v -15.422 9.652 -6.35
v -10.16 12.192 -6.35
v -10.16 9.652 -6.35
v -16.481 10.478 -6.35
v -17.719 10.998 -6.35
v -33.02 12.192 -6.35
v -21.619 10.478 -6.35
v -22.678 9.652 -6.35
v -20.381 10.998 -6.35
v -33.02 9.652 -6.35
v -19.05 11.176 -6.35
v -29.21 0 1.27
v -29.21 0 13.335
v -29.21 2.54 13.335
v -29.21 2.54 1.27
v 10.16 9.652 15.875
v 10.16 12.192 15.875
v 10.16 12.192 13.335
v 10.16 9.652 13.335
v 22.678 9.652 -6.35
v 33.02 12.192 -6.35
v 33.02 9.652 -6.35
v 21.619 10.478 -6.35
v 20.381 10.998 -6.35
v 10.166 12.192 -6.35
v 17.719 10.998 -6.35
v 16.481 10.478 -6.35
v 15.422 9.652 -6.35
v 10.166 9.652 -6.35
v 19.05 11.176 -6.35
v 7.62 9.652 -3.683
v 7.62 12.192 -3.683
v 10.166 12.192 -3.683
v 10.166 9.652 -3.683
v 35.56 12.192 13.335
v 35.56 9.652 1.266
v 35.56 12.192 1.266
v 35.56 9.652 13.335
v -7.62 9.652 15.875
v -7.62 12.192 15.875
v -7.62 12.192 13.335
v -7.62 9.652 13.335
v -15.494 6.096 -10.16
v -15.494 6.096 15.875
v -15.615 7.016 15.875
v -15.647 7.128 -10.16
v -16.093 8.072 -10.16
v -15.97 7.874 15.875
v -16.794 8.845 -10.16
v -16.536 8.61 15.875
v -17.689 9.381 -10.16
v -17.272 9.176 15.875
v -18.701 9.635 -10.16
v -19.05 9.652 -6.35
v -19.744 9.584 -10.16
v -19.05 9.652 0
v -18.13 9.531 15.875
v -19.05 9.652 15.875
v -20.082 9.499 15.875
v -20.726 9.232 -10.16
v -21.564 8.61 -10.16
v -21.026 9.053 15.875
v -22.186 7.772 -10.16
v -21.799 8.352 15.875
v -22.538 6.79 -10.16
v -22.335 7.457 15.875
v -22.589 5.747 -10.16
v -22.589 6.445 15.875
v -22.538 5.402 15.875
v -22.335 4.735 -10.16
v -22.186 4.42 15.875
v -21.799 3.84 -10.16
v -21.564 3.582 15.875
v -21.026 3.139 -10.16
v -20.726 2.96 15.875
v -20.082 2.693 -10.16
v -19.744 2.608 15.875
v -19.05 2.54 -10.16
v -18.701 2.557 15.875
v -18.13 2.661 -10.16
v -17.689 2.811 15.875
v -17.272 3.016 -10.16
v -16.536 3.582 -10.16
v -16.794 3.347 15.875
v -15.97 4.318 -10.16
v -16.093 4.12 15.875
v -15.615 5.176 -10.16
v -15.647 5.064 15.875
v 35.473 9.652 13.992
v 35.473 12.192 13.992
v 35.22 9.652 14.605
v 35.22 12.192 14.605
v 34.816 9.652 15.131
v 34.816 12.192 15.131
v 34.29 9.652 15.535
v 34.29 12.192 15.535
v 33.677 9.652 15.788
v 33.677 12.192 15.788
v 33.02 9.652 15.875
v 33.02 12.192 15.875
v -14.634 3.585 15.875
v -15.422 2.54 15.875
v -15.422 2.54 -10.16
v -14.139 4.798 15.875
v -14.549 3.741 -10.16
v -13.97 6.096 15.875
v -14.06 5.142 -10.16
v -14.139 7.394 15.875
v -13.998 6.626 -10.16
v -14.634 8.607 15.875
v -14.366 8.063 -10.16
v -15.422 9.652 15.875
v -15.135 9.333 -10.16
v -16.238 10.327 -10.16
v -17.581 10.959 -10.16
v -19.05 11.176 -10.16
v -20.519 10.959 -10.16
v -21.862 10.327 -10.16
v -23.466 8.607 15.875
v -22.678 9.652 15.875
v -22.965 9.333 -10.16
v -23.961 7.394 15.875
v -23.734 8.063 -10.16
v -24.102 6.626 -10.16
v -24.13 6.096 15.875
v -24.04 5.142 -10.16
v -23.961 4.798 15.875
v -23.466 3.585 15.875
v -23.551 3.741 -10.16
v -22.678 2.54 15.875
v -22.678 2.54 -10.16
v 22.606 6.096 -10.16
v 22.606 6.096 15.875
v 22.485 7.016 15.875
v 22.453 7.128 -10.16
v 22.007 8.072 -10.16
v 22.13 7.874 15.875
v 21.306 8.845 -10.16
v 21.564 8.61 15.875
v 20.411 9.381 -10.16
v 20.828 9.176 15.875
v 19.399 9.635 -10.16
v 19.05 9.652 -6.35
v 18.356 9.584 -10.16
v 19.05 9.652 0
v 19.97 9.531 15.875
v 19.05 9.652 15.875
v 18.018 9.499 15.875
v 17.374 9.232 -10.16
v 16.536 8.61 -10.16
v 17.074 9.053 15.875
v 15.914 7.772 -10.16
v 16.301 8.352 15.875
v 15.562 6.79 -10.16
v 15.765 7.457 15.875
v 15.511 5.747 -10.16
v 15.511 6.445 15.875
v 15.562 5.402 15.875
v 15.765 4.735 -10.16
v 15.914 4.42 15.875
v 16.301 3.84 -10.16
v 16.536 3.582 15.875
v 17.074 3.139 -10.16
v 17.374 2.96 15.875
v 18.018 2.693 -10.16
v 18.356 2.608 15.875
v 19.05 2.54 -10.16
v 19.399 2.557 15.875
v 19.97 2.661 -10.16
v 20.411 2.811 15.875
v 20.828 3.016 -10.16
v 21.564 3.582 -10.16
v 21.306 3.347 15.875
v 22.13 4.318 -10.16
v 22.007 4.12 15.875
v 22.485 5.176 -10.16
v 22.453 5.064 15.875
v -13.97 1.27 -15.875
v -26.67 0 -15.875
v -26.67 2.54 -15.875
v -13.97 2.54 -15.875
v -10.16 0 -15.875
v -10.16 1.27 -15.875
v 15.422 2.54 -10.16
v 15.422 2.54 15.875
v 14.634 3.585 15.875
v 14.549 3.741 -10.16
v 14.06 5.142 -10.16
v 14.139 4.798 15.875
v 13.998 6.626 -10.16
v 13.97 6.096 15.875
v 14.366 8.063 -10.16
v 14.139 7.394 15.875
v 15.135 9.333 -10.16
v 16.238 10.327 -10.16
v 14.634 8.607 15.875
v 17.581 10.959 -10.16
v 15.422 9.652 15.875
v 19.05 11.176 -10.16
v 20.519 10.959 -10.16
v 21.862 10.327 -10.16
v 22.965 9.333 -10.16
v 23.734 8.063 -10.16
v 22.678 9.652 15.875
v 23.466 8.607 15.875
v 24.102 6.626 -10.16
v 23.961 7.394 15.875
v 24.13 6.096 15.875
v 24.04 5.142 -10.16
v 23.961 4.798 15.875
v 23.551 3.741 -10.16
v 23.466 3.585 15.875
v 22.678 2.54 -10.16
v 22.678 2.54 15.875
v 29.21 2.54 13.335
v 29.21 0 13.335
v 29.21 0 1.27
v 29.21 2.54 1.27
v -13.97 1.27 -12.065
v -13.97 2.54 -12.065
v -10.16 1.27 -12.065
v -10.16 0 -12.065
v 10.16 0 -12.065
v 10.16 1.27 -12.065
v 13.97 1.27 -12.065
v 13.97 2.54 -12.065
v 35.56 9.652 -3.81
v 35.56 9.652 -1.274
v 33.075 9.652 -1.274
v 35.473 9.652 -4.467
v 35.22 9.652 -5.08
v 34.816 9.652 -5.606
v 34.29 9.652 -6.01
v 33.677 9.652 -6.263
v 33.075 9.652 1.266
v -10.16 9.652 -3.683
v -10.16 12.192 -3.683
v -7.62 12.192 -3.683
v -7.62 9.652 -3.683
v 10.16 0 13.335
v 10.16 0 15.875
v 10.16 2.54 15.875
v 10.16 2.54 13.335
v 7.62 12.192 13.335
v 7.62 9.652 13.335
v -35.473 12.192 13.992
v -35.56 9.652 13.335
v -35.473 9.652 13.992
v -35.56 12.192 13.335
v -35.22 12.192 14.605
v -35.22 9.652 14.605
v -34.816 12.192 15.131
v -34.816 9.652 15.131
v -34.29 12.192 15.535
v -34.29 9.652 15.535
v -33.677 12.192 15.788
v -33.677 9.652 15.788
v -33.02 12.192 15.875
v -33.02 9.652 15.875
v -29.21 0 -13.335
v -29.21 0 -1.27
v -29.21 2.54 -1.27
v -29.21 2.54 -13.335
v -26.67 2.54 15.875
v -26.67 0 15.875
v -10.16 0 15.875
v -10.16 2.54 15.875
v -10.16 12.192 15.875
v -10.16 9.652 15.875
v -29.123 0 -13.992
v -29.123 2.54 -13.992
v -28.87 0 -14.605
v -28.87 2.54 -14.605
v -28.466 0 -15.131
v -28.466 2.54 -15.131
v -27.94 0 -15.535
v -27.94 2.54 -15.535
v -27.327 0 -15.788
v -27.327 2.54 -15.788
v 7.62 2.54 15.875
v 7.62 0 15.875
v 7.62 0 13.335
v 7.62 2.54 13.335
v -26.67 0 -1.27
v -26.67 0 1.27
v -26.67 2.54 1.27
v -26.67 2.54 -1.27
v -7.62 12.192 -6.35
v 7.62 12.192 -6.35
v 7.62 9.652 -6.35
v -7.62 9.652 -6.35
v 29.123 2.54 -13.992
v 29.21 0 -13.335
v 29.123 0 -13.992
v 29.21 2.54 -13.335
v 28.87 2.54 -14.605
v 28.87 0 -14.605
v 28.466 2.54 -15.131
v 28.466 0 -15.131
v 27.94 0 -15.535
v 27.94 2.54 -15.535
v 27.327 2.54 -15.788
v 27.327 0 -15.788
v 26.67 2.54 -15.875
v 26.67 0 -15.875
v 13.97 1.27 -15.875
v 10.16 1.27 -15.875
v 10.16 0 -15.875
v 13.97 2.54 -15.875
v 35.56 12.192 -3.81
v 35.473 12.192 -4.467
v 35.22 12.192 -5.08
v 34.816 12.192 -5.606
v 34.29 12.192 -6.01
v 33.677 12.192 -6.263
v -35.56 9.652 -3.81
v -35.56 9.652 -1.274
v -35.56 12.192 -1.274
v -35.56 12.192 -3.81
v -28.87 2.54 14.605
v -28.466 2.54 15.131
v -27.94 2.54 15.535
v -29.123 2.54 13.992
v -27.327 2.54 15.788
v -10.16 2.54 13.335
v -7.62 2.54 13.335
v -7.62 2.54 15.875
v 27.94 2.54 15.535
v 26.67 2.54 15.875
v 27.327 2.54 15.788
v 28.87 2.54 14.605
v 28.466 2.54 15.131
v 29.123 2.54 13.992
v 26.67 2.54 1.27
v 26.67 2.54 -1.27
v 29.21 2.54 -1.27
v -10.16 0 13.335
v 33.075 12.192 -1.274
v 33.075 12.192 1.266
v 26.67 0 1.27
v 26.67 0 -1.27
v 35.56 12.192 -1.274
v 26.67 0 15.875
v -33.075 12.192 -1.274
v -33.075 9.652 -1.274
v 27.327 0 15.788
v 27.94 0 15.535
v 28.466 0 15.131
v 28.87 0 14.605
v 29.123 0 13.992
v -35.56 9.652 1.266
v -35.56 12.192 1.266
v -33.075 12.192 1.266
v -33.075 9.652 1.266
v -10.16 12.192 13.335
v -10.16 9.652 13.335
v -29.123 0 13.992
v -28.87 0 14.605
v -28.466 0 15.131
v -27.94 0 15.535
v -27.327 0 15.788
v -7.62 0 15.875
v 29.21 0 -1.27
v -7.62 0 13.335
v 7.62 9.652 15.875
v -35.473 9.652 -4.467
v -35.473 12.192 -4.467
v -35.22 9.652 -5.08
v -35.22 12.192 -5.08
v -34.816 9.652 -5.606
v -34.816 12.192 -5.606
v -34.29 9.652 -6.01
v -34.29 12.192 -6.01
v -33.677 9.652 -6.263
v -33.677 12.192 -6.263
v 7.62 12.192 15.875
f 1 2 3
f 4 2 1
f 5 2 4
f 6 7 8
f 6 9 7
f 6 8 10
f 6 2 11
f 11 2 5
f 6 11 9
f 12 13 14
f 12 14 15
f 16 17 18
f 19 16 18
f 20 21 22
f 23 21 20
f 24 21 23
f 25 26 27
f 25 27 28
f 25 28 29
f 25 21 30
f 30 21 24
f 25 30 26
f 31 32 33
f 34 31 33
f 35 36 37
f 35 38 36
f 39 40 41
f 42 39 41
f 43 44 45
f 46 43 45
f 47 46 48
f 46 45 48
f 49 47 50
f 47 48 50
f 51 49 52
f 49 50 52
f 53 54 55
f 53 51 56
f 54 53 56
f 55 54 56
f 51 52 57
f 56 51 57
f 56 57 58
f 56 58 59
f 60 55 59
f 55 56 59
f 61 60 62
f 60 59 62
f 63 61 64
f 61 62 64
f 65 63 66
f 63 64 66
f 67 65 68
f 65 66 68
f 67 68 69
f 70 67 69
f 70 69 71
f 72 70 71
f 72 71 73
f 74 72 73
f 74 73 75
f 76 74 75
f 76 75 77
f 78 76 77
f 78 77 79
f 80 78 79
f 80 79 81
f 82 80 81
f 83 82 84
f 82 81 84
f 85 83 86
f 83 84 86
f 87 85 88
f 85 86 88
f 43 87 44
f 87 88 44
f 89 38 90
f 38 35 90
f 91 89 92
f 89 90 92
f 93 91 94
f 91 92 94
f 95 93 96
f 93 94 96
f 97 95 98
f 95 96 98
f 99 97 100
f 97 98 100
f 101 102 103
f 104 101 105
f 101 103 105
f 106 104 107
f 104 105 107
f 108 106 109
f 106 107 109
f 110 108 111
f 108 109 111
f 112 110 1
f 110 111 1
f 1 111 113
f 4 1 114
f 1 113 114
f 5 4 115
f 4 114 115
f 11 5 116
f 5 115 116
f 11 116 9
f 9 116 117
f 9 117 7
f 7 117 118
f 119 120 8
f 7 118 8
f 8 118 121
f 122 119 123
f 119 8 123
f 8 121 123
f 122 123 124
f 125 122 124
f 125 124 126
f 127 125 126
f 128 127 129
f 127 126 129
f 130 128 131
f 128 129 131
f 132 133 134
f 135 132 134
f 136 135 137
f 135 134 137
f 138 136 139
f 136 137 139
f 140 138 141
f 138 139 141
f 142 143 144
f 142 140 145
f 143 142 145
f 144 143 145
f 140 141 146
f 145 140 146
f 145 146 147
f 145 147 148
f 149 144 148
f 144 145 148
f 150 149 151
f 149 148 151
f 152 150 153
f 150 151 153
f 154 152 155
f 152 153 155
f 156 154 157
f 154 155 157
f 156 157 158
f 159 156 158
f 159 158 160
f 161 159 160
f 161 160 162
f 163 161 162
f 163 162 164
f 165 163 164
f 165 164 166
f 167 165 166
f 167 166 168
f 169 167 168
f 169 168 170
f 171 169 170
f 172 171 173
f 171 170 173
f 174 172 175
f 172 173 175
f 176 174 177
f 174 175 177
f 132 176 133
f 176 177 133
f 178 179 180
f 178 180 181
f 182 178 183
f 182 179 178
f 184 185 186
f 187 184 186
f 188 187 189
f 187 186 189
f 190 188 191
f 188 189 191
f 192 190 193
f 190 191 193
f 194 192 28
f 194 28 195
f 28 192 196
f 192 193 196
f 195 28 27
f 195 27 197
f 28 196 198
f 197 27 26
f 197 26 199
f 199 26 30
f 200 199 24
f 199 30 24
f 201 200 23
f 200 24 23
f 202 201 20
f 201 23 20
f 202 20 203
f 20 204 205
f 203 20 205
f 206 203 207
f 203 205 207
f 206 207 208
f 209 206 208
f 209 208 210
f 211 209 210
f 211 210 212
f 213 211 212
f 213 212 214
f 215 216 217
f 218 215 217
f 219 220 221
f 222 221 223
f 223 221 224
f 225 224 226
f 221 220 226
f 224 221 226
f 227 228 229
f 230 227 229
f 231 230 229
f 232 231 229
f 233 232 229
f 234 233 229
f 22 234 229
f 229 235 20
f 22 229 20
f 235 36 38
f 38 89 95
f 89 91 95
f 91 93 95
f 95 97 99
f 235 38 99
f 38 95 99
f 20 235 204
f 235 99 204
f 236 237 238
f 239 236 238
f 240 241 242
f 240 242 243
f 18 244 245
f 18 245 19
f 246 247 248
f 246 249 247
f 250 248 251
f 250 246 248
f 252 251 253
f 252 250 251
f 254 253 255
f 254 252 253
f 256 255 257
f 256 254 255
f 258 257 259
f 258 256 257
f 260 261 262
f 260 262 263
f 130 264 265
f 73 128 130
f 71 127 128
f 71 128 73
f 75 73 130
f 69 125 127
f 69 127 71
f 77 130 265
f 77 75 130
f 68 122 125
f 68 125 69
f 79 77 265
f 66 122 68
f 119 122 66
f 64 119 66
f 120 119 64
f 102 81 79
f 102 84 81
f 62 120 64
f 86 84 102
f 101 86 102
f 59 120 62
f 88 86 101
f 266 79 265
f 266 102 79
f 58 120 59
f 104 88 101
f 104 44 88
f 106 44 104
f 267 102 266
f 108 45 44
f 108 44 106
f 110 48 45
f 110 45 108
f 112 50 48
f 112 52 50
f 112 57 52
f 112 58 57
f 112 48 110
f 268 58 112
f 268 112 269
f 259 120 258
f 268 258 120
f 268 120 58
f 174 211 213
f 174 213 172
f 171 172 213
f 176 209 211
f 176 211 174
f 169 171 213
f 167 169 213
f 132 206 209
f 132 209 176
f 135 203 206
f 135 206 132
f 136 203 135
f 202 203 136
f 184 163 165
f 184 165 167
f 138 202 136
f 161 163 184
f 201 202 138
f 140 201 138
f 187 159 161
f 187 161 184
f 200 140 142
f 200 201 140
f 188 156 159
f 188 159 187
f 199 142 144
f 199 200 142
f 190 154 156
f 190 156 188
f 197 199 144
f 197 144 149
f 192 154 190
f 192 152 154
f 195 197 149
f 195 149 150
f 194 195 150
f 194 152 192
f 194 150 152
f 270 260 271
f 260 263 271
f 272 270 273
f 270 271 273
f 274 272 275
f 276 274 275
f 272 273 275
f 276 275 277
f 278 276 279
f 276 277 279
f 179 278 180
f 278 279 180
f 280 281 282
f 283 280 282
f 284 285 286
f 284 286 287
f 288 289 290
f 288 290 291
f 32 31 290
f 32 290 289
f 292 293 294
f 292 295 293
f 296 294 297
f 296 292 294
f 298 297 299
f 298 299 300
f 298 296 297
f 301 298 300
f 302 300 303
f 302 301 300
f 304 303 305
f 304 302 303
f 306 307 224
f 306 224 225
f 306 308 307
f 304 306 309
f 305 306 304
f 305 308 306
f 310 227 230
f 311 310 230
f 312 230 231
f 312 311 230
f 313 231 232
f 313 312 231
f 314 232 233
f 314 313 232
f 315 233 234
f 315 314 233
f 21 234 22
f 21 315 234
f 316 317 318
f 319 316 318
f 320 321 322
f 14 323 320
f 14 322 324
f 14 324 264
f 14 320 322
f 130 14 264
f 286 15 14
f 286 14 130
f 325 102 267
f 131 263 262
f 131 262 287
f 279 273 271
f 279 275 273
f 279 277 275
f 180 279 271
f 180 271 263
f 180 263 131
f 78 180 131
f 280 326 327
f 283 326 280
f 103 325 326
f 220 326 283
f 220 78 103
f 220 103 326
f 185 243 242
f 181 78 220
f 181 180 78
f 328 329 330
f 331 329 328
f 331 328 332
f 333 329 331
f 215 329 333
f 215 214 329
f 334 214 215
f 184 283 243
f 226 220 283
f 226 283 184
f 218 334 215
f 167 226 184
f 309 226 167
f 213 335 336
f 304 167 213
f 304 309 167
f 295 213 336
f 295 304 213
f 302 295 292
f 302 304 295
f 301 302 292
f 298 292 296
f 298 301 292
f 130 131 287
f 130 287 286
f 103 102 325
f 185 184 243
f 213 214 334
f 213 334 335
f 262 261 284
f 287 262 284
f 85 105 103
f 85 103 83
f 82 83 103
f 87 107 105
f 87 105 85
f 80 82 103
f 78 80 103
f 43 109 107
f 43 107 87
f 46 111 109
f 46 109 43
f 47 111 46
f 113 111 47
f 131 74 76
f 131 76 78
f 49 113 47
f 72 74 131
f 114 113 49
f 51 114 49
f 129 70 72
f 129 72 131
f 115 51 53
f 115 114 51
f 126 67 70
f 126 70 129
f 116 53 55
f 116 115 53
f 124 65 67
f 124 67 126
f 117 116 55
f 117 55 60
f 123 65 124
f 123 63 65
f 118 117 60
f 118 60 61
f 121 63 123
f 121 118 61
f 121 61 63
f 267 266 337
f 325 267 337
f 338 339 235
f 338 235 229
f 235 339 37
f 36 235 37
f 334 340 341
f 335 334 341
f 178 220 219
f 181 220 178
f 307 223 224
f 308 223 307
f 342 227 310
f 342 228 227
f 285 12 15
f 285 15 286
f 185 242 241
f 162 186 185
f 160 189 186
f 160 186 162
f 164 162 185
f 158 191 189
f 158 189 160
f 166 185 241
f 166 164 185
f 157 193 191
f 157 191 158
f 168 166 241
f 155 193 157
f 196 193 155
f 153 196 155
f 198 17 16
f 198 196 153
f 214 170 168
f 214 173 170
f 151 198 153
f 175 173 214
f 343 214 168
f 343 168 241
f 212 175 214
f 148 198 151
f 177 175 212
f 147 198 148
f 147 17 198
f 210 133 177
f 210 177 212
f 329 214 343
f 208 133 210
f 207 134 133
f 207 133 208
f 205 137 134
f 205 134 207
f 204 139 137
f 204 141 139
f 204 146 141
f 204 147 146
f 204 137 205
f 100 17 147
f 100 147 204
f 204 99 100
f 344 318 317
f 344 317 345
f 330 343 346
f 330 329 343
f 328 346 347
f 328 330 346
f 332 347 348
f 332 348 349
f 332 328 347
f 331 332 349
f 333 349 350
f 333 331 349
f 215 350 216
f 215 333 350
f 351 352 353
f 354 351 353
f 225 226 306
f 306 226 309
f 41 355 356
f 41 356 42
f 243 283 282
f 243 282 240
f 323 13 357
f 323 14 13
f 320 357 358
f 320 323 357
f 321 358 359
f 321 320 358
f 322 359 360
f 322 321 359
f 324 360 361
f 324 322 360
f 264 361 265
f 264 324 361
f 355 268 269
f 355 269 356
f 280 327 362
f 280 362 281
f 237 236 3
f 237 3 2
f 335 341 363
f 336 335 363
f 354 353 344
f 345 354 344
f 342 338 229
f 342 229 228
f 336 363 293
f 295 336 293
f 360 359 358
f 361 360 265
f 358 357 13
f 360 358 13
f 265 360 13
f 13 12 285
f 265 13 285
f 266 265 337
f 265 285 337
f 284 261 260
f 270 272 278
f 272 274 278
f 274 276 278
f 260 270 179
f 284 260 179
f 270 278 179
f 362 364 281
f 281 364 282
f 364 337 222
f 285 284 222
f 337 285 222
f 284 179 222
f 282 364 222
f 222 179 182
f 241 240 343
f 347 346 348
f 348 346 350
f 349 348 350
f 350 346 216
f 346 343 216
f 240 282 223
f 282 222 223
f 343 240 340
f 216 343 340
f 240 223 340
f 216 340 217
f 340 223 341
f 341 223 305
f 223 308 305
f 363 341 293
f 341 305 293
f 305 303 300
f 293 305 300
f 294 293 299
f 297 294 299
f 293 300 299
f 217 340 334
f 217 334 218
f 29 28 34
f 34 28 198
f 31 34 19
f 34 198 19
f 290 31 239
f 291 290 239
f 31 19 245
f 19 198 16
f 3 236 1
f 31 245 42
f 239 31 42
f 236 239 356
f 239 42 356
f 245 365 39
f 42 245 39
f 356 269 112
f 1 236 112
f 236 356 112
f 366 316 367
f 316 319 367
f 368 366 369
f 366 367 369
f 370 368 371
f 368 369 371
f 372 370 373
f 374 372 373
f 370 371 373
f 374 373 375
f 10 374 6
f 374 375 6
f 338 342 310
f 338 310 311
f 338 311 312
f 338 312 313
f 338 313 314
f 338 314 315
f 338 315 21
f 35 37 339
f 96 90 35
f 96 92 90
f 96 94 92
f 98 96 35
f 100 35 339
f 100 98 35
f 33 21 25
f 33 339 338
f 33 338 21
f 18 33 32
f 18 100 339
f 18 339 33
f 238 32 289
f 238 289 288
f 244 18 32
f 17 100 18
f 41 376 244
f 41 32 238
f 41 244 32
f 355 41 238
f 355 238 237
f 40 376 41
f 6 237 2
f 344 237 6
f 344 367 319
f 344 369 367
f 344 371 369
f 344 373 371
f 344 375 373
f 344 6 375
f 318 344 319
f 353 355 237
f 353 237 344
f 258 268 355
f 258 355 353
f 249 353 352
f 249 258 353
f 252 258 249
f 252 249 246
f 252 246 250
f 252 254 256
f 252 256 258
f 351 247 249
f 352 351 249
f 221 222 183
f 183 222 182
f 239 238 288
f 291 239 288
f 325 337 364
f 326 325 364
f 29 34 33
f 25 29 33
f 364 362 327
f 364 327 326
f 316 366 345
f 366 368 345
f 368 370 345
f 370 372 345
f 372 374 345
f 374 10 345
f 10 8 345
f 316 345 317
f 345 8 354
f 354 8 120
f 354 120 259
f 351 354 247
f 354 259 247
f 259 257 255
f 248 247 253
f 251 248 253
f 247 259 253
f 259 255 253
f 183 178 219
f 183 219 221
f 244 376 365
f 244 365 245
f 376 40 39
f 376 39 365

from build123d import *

# Parameters (mm, degrees)
SKETCH1_W           = 58.42
SKETCH1_H           = 31.75
BOSS_EXTRUDE1_DEPTH = 2.54
FILLET1_R           = 2.54
SKETCH4_R           = 5.08
BOSS_EXTRUDE3_DEPTH = 15.875
SKETCH5_R           = 5.08
BOSS_EXTRUDE4_DEPTH = 10.16
SKETCH6_R           = 3.556
CUT_EXTRUDE2_DEPTH  = 32.75
SKETCH9_W           = 13.97
SKETCH9_H           = 3.81
CUT_EXTRUDE4_DEPTH  = 1.27
SKETCH10_W          = 2.54
SKETCH10_H          = 2.54
SKETCH10_W_2        = 20.32
SKETCH10_H_2        = 3.81
CUT_EXTRUDE6_DEPTH  = 12.176
SKETCH11_W          = 71.12
SKETCH11_H          = 2.54
BOSS_EXTRUDE5_DEPTH = 15.875
SKETCH12_W          = 71.12
SKETCH12_H          = 2.54
BOSS_EXTRUDE6_DEPTH = 6.35
FILLET2_R           = 2.54
SKETCH13_W          = 2.54
SKETCH13_H          = 2.54
CUT_EXTRUDE7_DEPTH  = 2.54
SKETCH14_W          = 2.54
SKETCH14_H          = 2.54
SKETCH14_W_2        = 2.546026668
CUT_EXTRUDE8_DEPTH  = 13.192


with BuildPart() as part:
    # Sketch1 → Boss-Extrude1 (new body)
    with BuildSketch(Plane(origin=(0, 0, 0), x_dir=(1, 0, 0), z_dir=(0, 1, 0))):
        Rectangle(SKETCH1_W, SKETCH1_H)
    extrude(amount=BOSS_EXTRUDE1_DEPTH)

    # Fillet1
    fillet1_edges = [part.edges().sort_by_distance(p)[0] for p in [
        (29.21, 1.27, 15.875),
        (-29.21, 1.27, 15.875),
        (-29.21, 1.27, -15.875),
        (29.21, 1.27, -15.875),
    ]]
    fillet(fillet1_edges, radius=FILLET1_R)

    # Sketch4 → Boss-Extrude3 (add)
    with BuildSketch(Plane.XY):
        with Locations((-19.05, 6.096)):
            Circle(SKETCH4_R)
        with Locations((19.05, 6.096)):
            Circle(SKETCH4_R)
    extrude(amount=BOSS_EXTRUDE3_DEPTH)

    # Sketch5 → Boss-Extrude4 (add)
    with BuildSketch(Plane(origin=(0, 0, 0), x_dir=(-1, 0, 0), z_dir=(0, 0, -1))):
        with Locations((-19.05, 6.096)):
            Circle(SKETCH5_R)
        with Locations((19.05, 6.096)):
            Circle(SKETCH5_R)
    extrude(amount=BOSS_EXTRUDE4_DEPTH)

    # Sketch6 → Cut-Extrude2 (cut, through all)
    with BuildSketch(Plane.XY.offset(15.875)):
        with Locations((-19.05, 6.096)):
            Circle(SKETCH6_R)
        with Locations((19.05, 6.096)):
            Circle(SKETCH6_R)
    extrude(amount=-CUT_EXTRUDE2_DEPTH, mode=Mode.SUBTRACT)

    # Sketch9 → Cut-Extrude4 (cut)
    with BuildSketch(Plane(origin=(0, 2.54, 0), x_dir=(1, 0, 0), z_dir=(0, 1, 0))):
        with Locations((-6.985, 13.97)):
            Rectangle(SKETCH9_W, SKETCH9_H)
        with Locations((6.985, 13.97)):
            Rectangle(SKETCH9_W, SKETCH9_H)
    extrude(amount=-CUT_EXTRUDE4_DEPTH, mode=Mode.SUBTRACT)

    # Sketch10 → Cut-Extrude6 (cut, through all)
    with BuildSketch(Plane(origin=(0, 0, 0), x_dir=(1, 0, 0), z_dir=(0, 1, 0))):
        with Locations((-27.94, 0)):
            Rectangle(SKETCH10_W, SKETCH10_H)
        with Locations((27.94, 0)):
            Rectangle(SKETCH10_W, SKETCH10_H)
        with Locations((0, 13.97)):
            Rectangle(SKETCH10_W_2, SKETCH10_H_2)
        with Locations((-8.89, -14.605)):
            Rectangle(SKETCH10_W, SKETCH10_H)
        with Locations((8.89, -14.605)):
            Rectangle(SKETCH10_W, SKETCH10_H)
    extrude(amount=CUT_EXTRUDE6_DEPTH, mode=Mode.SUBTRACT)

    # Sketch11 → Boss-Extrude5 (add)
    with BuildSketch(Plane.XY):
        with Locations((0, 10.922)):
            Rectangle(SKETCH11_W, SKETCH11_H)
    extrude(amount=BOSS_EXTRUDE5_DEPTH)

    # Sketch12 → Boss-Extrude6 (add)
    with BuildSketch(Plane(origin=(0, 0, 0), x_dir=(-1, 0, 0), z_dir=(0, 0, -1))):
        with Locations((0, 10.922)):
            Rectangle(SKETCH12_W, SKETCH12_H)
    extrude(amount=BOSS_EXTRUDE6_DEPTH)

    # Fillet2
    fillet2_edges = [part.edges().sort_by_distance(p)[0] for p in [
        (-35.56, 10.922, 15.875),
        (35.56, 10.922, 15.875),
        (-35.56, 10.922, -6.35),
        (35.56, 10.922, -6.35),
    ]]
    fillet(fillet2_edges, radius=FILLET2_R)

    # Sketch13 → Cut-Extrude7 (cut)
    with BuildSketch(Plane(origin=(0, 12.192, 0), x_dir=(1, 0, 0), z_dir=(0, 1, 0))):
        with Locations((-34.344972833, 0.003915147)):
            Rectangle(SKETCH13_W, SKETCH13_H)
        with Locations((8.89, -14.605)):
            Rectangle(SKETCH13_W, SKETCH13_H)
        with Locations((-8.89, -14.605)):
            Rectangle(SKETCH13_W, SKETCH13_H)
        with Locations((34.344972833, 0.003915147)):
            Rectangle(SKETCH13_W, SKETCH13_H)
        with Locations((8.89, 4.953)):
            Rectangle(SKETCH13_W, SKETCH13_H)
        with Locations((-8.89, 4.953)):
            Rectangle(SKETCH13_W, SKETCH13_H)
    extrude(amount=-CUT_EXTRUDE7_DEPTH, mode=Mode.SUBTRACT)

    # Sketch14 → Cut-Extrude8 (cut, through all)
    with BuildSketch(Plane(origin=(0, 0, -3.683), x_dir=(-1, 0, 0), z_dir=(0, 0, -1))):
        with Locations((8.89, 10.922)):
            Rectangle(SKETCH14_W, SKETCH14_H)
        with Locations((-8.893013334, 10.922)):
            Rectangle(SKETCH14_W_2, SKETCH14_H)
    extrude(amount=CUT_EXTRUDE8_DEPTH, mode=Mode.SUBTRACT)


solid = part.part
